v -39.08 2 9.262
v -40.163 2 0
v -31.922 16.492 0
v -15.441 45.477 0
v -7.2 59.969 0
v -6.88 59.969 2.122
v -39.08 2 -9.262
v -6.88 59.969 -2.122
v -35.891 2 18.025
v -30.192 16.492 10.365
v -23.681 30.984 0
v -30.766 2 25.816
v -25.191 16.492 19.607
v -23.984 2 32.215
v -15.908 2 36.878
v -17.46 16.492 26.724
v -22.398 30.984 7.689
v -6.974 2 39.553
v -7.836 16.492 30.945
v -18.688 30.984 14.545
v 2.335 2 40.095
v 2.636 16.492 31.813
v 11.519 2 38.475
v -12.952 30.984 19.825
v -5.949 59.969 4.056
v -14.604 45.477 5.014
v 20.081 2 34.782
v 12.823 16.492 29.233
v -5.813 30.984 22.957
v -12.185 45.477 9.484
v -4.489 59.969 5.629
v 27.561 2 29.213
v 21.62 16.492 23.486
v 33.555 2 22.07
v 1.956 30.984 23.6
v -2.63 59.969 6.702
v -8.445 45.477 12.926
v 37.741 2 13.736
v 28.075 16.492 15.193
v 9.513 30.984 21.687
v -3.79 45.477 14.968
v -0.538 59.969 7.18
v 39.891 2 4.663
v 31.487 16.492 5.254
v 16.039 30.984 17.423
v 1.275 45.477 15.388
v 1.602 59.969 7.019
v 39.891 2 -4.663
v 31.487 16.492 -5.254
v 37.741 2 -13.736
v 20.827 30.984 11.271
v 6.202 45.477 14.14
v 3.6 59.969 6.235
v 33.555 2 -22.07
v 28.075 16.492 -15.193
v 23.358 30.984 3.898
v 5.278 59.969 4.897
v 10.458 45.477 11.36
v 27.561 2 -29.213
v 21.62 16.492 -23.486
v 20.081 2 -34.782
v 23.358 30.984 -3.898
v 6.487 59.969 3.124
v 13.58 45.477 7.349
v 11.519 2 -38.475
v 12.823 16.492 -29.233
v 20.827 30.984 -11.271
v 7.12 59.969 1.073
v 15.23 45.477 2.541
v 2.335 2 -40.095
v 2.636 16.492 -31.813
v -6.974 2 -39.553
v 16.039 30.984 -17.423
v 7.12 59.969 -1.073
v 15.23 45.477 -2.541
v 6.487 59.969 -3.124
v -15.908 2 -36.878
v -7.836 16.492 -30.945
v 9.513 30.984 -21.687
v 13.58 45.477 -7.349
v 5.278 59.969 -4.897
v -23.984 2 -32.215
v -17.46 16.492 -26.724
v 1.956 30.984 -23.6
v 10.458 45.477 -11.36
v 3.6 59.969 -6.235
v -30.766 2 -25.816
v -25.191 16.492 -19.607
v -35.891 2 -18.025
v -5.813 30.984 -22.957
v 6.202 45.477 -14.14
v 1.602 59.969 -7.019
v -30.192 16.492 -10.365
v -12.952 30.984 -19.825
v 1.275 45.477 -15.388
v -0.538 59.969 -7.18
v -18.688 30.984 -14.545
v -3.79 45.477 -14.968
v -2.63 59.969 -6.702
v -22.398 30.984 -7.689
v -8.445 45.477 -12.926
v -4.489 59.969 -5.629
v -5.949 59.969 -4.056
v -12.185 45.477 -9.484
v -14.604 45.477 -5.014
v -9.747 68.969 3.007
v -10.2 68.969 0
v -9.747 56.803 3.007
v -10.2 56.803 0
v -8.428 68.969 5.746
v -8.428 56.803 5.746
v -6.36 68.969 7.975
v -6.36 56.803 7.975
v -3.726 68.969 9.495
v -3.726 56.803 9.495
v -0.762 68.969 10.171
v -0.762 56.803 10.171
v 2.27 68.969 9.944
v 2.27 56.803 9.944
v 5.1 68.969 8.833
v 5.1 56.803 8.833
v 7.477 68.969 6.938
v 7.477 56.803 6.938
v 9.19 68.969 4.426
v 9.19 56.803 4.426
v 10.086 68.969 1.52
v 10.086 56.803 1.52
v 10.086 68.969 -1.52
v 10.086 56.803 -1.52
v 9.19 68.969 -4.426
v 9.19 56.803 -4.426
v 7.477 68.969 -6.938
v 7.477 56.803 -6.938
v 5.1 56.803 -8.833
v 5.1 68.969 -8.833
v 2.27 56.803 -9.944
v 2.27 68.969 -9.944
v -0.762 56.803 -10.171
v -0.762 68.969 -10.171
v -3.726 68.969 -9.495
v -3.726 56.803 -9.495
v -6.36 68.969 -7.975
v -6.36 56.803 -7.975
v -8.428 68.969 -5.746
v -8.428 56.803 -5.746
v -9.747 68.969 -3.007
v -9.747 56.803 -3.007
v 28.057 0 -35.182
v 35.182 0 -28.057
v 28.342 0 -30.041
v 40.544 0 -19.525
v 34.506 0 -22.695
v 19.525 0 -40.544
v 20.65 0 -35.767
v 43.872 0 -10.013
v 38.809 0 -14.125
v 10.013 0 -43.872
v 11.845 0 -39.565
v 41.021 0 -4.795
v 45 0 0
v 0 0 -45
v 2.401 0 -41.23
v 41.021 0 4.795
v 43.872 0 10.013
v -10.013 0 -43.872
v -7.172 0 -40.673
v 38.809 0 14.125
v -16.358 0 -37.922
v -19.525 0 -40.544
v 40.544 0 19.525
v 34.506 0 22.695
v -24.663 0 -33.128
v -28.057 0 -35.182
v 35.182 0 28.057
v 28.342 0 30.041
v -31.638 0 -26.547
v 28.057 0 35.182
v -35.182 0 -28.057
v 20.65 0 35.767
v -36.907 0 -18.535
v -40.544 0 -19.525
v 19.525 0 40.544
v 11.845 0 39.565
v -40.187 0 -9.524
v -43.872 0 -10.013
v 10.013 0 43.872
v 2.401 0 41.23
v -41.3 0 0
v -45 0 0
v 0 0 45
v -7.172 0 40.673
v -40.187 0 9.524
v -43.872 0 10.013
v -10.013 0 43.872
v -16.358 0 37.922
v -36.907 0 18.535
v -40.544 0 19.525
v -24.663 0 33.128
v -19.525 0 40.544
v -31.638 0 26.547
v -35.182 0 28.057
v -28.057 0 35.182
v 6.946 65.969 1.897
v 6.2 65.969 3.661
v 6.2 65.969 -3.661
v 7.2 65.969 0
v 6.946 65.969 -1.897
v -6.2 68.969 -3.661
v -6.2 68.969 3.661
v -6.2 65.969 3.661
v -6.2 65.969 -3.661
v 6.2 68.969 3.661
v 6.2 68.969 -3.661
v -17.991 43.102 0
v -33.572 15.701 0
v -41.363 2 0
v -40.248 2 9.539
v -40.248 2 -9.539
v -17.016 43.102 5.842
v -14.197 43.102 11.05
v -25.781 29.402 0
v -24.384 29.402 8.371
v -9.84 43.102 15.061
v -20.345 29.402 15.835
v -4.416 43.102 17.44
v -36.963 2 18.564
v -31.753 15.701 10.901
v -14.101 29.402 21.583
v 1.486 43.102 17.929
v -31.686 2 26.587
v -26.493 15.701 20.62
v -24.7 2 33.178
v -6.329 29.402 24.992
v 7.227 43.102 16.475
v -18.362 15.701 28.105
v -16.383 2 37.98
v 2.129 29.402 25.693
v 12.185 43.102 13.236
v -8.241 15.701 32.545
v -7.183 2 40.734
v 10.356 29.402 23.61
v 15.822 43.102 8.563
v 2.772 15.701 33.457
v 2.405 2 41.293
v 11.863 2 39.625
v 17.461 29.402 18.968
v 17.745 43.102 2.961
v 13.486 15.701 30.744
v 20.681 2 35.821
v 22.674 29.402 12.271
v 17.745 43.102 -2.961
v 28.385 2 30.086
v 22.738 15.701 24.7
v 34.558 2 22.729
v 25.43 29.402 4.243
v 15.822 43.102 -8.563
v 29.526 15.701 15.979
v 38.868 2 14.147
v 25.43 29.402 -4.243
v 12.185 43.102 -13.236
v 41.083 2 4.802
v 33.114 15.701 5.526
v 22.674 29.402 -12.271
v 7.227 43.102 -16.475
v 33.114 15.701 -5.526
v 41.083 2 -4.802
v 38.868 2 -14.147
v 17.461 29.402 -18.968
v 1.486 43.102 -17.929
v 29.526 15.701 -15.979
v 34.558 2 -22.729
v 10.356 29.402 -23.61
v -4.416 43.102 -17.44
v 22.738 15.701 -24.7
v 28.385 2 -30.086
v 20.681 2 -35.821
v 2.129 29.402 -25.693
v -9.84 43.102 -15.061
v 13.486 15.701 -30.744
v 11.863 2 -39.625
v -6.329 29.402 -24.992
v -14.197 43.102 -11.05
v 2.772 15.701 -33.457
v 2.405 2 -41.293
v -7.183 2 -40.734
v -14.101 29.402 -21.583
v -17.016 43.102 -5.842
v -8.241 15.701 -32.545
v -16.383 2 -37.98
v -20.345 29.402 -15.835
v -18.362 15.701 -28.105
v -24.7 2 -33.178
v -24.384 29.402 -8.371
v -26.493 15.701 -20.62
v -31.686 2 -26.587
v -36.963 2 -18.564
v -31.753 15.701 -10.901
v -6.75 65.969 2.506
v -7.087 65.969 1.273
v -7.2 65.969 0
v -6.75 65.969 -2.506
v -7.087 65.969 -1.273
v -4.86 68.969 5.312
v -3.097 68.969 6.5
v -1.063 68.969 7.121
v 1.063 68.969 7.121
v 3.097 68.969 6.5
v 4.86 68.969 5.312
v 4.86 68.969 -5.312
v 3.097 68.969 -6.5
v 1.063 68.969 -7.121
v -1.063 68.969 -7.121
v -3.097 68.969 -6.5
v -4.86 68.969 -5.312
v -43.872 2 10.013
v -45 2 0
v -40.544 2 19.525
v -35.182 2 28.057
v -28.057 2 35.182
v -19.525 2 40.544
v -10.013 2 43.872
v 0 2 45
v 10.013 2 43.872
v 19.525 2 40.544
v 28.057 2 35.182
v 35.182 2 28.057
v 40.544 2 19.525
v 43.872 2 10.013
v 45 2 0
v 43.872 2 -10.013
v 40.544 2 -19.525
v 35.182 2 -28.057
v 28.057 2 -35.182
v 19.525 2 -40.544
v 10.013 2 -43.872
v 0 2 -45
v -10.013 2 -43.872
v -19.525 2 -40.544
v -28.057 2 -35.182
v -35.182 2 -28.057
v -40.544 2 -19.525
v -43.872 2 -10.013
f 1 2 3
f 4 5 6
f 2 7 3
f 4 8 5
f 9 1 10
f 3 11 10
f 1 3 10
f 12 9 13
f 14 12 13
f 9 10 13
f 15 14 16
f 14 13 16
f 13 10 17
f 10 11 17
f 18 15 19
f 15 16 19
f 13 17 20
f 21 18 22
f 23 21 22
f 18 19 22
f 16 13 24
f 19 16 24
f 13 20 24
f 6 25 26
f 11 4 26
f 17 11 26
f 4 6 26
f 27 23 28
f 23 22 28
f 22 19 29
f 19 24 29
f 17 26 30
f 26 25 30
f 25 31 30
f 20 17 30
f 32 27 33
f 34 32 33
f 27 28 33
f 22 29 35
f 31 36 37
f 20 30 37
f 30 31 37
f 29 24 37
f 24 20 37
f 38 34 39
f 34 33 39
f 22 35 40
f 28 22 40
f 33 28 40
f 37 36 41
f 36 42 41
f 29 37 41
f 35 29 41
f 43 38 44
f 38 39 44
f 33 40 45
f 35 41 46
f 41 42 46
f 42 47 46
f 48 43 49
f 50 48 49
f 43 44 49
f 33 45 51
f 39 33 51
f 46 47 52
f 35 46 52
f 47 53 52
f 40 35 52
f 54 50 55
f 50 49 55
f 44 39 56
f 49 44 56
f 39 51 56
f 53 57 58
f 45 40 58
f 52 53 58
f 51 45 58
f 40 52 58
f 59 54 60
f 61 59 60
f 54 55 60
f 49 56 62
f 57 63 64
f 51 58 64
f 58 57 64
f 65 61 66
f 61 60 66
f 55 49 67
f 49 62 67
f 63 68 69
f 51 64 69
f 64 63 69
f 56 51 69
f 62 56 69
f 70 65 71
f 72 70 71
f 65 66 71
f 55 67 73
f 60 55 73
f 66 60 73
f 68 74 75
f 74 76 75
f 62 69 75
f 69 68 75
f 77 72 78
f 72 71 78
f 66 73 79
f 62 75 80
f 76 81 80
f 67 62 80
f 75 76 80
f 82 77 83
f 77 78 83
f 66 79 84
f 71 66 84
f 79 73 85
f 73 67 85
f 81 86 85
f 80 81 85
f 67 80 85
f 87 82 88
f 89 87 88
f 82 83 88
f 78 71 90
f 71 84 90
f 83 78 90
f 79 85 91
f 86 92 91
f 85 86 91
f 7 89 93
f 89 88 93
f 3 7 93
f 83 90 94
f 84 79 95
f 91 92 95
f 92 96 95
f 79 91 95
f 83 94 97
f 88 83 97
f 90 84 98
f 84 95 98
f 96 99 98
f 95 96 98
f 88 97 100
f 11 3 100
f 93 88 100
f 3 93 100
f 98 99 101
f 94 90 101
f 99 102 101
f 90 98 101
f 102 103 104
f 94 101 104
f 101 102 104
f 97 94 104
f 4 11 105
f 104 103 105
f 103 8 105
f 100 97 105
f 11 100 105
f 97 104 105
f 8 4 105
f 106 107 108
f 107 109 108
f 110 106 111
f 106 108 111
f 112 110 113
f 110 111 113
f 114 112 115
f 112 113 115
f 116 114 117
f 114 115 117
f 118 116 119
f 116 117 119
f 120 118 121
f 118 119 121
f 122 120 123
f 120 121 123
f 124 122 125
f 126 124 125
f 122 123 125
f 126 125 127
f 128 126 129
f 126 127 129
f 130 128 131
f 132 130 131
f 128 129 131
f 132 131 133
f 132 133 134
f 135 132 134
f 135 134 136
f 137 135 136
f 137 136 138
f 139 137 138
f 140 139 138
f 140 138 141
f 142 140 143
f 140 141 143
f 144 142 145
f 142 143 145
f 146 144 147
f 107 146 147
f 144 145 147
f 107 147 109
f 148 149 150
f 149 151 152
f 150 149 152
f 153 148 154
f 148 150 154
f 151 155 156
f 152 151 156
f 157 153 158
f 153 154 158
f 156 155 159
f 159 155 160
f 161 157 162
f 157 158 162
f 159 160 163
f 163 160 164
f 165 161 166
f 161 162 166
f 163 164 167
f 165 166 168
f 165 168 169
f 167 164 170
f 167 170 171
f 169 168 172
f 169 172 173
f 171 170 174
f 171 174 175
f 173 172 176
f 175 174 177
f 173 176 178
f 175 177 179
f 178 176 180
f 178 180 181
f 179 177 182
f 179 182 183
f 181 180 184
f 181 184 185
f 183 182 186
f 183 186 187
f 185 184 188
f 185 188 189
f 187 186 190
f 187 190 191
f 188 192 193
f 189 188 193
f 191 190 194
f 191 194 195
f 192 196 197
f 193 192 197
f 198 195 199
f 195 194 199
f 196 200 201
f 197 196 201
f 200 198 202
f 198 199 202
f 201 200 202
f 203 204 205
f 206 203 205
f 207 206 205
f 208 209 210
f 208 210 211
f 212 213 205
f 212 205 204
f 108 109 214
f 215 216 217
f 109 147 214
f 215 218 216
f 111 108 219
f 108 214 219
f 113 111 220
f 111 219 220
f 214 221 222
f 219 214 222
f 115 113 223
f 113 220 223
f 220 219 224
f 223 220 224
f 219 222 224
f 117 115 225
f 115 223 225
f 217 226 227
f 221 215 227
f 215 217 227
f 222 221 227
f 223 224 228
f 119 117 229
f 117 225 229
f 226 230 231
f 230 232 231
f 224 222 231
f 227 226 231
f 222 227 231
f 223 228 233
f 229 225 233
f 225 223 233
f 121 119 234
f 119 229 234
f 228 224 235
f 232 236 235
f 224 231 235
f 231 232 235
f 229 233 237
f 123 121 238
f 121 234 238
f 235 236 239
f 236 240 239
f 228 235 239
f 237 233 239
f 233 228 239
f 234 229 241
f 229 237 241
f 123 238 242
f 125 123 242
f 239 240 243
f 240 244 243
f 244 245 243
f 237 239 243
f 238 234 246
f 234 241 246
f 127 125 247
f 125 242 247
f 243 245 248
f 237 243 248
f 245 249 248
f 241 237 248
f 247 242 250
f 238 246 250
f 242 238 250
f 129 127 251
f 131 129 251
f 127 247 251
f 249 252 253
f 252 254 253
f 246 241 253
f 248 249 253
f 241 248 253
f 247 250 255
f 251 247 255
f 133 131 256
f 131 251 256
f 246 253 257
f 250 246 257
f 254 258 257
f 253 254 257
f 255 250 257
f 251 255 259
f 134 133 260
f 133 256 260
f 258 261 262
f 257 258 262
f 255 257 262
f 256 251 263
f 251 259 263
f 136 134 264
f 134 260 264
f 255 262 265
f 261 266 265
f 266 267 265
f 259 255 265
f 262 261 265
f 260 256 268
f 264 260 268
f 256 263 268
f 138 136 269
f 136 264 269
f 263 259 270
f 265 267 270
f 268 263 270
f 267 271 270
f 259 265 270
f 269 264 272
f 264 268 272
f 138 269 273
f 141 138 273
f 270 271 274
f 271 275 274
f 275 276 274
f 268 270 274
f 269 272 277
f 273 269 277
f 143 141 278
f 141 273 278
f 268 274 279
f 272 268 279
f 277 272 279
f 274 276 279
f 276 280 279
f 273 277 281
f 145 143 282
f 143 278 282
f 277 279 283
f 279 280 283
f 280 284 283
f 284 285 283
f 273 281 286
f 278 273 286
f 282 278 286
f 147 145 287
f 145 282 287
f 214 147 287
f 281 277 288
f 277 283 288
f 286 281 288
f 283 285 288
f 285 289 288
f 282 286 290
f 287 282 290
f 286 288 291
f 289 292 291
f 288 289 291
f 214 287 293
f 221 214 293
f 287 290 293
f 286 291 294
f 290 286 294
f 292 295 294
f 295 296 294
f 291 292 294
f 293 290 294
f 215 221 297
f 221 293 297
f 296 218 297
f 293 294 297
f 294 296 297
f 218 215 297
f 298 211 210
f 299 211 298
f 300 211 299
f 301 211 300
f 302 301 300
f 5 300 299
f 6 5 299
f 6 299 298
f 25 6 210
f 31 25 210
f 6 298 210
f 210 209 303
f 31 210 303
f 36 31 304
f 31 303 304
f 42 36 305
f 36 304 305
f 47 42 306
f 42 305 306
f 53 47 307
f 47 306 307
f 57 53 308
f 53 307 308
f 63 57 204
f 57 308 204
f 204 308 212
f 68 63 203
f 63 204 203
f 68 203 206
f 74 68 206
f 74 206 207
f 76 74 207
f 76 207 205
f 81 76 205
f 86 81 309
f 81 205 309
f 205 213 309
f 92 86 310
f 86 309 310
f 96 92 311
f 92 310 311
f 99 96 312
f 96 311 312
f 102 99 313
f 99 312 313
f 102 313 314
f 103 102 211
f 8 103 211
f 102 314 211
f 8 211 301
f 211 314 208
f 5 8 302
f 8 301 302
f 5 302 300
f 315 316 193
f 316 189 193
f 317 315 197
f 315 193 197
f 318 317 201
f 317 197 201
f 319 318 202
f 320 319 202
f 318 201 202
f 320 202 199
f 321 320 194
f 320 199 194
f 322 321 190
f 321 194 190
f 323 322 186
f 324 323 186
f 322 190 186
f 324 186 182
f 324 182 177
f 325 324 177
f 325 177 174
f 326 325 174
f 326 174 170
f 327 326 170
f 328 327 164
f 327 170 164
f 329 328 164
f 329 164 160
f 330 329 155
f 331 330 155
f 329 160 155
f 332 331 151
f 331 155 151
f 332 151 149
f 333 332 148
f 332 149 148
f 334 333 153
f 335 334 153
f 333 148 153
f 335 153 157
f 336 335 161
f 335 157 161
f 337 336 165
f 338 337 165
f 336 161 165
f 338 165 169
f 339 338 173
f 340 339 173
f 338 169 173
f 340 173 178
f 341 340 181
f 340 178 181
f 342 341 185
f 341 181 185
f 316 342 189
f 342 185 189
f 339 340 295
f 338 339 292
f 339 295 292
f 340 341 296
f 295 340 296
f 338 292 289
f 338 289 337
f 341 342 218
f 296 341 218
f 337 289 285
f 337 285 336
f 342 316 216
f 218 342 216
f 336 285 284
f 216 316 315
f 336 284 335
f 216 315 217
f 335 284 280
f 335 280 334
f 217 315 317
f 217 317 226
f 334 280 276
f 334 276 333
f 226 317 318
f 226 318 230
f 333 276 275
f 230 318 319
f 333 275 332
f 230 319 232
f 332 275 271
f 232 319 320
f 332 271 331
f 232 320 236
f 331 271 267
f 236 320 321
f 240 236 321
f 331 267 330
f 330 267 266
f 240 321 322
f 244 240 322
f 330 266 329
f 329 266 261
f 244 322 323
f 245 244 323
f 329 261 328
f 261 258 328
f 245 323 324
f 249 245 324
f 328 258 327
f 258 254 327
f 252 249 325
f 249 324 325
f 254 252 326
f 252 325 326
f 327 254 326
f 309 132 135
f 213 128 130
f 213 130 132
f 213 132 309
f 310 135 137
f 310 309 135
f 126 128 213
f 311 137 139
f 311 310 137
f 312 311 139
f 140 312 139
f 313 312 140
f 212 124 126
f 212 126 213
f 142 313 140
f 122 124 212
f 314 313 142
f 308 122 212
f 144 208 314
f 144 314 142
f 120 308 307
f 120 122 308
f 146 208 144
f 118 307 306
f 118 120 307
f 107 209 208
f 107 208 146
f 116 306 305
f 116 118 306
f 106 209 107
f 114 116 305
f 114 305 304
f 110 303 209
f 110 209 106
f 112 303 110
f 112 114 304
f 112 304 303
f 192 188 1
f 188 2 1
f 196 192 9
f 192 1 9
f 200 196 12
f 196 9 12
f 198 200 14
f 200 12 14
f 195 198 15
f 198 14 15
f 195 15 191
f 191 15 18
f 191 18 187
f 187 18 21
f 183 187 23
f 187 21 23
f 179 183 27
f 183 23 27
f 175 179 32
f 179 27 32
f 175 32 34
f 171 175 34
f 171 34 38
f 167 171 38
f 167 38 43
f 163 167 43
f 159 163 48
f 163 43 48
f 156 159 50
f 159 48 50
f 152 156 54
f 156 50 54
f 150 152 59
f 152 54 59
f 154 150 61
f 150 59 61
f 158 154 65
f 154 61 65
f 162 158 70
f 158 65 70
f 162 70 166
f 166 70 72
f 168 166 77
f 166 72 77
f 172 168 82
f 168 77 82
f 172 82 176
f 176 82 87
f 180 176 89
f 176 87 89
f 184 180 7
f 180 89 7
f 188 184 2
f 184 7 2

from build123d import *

# Parameters (mm, degrees)
F4_DEPTH = 3


with BuildPart() as f1:
    # F0 (on Top) → F1 (revolve)
    with BuildSketch(Plane.XY):
        Polygon((-41.3627406567, 2), (-40.1627406567, 2), (-7.2, 59.9687313223), (-8.4, 59.9687313223), (-10.2, 56.8032264431), align=None)
        Polygon((-10.2, 56.8032264431), (-8.4, 59.9687313223), (-10.2, 59.9687313223), align=None)
        Polygon((-8.4, 59.9687313223), (-7.2, 59.9687313223), (-7.2, 68.9687313223), (-10.2, 68.9687313223), (-10.2, 59.9687313223), align=None)
        Polygon((-42.5, 0), (-41.3, 0), (-40.1627406567, 2), (-41.3627406567, 2), align=None)
        Polygon((-45, 0), (-42.5, 0), (-41.3627406567, 2), (-45, 2), align=None)
    revolve(axis=Axis((0, 36.8, 0), (0, 1, 0)))

    # F3 (on offset) → F4 (join)
    with BuildSketch(Plane(origin=(0, 68.9687313223, 0), x_dir=(-1, 0, 0), z_dir=(0, 1, 0))):
        with BuildLine():
            ThreePointArc((6.2, -3.6606010435), (6.9455021417, -1.8973665961), (7.2, 0))
            ThreePointArc((7.2, 0), (6.9455021417, 1.8973665961), (6.2, 3.6606010435))
            Line((6.2, 3.6606010435), (6.2, 0))
            Line((6.2, 0), (6.2, -3.6606010435))
        make_face()
        with BuildLine():
            Line((-6.2, -3.6606010435), (-6.2, 3.6606010435))
            ThreePointArc((-6.2, 3.6606010435), (-7.2, 0), (-6.2, -3.6606010435))
        make_face()
    extrude(amount=-F4_DEPTH)


solid = f1.part
